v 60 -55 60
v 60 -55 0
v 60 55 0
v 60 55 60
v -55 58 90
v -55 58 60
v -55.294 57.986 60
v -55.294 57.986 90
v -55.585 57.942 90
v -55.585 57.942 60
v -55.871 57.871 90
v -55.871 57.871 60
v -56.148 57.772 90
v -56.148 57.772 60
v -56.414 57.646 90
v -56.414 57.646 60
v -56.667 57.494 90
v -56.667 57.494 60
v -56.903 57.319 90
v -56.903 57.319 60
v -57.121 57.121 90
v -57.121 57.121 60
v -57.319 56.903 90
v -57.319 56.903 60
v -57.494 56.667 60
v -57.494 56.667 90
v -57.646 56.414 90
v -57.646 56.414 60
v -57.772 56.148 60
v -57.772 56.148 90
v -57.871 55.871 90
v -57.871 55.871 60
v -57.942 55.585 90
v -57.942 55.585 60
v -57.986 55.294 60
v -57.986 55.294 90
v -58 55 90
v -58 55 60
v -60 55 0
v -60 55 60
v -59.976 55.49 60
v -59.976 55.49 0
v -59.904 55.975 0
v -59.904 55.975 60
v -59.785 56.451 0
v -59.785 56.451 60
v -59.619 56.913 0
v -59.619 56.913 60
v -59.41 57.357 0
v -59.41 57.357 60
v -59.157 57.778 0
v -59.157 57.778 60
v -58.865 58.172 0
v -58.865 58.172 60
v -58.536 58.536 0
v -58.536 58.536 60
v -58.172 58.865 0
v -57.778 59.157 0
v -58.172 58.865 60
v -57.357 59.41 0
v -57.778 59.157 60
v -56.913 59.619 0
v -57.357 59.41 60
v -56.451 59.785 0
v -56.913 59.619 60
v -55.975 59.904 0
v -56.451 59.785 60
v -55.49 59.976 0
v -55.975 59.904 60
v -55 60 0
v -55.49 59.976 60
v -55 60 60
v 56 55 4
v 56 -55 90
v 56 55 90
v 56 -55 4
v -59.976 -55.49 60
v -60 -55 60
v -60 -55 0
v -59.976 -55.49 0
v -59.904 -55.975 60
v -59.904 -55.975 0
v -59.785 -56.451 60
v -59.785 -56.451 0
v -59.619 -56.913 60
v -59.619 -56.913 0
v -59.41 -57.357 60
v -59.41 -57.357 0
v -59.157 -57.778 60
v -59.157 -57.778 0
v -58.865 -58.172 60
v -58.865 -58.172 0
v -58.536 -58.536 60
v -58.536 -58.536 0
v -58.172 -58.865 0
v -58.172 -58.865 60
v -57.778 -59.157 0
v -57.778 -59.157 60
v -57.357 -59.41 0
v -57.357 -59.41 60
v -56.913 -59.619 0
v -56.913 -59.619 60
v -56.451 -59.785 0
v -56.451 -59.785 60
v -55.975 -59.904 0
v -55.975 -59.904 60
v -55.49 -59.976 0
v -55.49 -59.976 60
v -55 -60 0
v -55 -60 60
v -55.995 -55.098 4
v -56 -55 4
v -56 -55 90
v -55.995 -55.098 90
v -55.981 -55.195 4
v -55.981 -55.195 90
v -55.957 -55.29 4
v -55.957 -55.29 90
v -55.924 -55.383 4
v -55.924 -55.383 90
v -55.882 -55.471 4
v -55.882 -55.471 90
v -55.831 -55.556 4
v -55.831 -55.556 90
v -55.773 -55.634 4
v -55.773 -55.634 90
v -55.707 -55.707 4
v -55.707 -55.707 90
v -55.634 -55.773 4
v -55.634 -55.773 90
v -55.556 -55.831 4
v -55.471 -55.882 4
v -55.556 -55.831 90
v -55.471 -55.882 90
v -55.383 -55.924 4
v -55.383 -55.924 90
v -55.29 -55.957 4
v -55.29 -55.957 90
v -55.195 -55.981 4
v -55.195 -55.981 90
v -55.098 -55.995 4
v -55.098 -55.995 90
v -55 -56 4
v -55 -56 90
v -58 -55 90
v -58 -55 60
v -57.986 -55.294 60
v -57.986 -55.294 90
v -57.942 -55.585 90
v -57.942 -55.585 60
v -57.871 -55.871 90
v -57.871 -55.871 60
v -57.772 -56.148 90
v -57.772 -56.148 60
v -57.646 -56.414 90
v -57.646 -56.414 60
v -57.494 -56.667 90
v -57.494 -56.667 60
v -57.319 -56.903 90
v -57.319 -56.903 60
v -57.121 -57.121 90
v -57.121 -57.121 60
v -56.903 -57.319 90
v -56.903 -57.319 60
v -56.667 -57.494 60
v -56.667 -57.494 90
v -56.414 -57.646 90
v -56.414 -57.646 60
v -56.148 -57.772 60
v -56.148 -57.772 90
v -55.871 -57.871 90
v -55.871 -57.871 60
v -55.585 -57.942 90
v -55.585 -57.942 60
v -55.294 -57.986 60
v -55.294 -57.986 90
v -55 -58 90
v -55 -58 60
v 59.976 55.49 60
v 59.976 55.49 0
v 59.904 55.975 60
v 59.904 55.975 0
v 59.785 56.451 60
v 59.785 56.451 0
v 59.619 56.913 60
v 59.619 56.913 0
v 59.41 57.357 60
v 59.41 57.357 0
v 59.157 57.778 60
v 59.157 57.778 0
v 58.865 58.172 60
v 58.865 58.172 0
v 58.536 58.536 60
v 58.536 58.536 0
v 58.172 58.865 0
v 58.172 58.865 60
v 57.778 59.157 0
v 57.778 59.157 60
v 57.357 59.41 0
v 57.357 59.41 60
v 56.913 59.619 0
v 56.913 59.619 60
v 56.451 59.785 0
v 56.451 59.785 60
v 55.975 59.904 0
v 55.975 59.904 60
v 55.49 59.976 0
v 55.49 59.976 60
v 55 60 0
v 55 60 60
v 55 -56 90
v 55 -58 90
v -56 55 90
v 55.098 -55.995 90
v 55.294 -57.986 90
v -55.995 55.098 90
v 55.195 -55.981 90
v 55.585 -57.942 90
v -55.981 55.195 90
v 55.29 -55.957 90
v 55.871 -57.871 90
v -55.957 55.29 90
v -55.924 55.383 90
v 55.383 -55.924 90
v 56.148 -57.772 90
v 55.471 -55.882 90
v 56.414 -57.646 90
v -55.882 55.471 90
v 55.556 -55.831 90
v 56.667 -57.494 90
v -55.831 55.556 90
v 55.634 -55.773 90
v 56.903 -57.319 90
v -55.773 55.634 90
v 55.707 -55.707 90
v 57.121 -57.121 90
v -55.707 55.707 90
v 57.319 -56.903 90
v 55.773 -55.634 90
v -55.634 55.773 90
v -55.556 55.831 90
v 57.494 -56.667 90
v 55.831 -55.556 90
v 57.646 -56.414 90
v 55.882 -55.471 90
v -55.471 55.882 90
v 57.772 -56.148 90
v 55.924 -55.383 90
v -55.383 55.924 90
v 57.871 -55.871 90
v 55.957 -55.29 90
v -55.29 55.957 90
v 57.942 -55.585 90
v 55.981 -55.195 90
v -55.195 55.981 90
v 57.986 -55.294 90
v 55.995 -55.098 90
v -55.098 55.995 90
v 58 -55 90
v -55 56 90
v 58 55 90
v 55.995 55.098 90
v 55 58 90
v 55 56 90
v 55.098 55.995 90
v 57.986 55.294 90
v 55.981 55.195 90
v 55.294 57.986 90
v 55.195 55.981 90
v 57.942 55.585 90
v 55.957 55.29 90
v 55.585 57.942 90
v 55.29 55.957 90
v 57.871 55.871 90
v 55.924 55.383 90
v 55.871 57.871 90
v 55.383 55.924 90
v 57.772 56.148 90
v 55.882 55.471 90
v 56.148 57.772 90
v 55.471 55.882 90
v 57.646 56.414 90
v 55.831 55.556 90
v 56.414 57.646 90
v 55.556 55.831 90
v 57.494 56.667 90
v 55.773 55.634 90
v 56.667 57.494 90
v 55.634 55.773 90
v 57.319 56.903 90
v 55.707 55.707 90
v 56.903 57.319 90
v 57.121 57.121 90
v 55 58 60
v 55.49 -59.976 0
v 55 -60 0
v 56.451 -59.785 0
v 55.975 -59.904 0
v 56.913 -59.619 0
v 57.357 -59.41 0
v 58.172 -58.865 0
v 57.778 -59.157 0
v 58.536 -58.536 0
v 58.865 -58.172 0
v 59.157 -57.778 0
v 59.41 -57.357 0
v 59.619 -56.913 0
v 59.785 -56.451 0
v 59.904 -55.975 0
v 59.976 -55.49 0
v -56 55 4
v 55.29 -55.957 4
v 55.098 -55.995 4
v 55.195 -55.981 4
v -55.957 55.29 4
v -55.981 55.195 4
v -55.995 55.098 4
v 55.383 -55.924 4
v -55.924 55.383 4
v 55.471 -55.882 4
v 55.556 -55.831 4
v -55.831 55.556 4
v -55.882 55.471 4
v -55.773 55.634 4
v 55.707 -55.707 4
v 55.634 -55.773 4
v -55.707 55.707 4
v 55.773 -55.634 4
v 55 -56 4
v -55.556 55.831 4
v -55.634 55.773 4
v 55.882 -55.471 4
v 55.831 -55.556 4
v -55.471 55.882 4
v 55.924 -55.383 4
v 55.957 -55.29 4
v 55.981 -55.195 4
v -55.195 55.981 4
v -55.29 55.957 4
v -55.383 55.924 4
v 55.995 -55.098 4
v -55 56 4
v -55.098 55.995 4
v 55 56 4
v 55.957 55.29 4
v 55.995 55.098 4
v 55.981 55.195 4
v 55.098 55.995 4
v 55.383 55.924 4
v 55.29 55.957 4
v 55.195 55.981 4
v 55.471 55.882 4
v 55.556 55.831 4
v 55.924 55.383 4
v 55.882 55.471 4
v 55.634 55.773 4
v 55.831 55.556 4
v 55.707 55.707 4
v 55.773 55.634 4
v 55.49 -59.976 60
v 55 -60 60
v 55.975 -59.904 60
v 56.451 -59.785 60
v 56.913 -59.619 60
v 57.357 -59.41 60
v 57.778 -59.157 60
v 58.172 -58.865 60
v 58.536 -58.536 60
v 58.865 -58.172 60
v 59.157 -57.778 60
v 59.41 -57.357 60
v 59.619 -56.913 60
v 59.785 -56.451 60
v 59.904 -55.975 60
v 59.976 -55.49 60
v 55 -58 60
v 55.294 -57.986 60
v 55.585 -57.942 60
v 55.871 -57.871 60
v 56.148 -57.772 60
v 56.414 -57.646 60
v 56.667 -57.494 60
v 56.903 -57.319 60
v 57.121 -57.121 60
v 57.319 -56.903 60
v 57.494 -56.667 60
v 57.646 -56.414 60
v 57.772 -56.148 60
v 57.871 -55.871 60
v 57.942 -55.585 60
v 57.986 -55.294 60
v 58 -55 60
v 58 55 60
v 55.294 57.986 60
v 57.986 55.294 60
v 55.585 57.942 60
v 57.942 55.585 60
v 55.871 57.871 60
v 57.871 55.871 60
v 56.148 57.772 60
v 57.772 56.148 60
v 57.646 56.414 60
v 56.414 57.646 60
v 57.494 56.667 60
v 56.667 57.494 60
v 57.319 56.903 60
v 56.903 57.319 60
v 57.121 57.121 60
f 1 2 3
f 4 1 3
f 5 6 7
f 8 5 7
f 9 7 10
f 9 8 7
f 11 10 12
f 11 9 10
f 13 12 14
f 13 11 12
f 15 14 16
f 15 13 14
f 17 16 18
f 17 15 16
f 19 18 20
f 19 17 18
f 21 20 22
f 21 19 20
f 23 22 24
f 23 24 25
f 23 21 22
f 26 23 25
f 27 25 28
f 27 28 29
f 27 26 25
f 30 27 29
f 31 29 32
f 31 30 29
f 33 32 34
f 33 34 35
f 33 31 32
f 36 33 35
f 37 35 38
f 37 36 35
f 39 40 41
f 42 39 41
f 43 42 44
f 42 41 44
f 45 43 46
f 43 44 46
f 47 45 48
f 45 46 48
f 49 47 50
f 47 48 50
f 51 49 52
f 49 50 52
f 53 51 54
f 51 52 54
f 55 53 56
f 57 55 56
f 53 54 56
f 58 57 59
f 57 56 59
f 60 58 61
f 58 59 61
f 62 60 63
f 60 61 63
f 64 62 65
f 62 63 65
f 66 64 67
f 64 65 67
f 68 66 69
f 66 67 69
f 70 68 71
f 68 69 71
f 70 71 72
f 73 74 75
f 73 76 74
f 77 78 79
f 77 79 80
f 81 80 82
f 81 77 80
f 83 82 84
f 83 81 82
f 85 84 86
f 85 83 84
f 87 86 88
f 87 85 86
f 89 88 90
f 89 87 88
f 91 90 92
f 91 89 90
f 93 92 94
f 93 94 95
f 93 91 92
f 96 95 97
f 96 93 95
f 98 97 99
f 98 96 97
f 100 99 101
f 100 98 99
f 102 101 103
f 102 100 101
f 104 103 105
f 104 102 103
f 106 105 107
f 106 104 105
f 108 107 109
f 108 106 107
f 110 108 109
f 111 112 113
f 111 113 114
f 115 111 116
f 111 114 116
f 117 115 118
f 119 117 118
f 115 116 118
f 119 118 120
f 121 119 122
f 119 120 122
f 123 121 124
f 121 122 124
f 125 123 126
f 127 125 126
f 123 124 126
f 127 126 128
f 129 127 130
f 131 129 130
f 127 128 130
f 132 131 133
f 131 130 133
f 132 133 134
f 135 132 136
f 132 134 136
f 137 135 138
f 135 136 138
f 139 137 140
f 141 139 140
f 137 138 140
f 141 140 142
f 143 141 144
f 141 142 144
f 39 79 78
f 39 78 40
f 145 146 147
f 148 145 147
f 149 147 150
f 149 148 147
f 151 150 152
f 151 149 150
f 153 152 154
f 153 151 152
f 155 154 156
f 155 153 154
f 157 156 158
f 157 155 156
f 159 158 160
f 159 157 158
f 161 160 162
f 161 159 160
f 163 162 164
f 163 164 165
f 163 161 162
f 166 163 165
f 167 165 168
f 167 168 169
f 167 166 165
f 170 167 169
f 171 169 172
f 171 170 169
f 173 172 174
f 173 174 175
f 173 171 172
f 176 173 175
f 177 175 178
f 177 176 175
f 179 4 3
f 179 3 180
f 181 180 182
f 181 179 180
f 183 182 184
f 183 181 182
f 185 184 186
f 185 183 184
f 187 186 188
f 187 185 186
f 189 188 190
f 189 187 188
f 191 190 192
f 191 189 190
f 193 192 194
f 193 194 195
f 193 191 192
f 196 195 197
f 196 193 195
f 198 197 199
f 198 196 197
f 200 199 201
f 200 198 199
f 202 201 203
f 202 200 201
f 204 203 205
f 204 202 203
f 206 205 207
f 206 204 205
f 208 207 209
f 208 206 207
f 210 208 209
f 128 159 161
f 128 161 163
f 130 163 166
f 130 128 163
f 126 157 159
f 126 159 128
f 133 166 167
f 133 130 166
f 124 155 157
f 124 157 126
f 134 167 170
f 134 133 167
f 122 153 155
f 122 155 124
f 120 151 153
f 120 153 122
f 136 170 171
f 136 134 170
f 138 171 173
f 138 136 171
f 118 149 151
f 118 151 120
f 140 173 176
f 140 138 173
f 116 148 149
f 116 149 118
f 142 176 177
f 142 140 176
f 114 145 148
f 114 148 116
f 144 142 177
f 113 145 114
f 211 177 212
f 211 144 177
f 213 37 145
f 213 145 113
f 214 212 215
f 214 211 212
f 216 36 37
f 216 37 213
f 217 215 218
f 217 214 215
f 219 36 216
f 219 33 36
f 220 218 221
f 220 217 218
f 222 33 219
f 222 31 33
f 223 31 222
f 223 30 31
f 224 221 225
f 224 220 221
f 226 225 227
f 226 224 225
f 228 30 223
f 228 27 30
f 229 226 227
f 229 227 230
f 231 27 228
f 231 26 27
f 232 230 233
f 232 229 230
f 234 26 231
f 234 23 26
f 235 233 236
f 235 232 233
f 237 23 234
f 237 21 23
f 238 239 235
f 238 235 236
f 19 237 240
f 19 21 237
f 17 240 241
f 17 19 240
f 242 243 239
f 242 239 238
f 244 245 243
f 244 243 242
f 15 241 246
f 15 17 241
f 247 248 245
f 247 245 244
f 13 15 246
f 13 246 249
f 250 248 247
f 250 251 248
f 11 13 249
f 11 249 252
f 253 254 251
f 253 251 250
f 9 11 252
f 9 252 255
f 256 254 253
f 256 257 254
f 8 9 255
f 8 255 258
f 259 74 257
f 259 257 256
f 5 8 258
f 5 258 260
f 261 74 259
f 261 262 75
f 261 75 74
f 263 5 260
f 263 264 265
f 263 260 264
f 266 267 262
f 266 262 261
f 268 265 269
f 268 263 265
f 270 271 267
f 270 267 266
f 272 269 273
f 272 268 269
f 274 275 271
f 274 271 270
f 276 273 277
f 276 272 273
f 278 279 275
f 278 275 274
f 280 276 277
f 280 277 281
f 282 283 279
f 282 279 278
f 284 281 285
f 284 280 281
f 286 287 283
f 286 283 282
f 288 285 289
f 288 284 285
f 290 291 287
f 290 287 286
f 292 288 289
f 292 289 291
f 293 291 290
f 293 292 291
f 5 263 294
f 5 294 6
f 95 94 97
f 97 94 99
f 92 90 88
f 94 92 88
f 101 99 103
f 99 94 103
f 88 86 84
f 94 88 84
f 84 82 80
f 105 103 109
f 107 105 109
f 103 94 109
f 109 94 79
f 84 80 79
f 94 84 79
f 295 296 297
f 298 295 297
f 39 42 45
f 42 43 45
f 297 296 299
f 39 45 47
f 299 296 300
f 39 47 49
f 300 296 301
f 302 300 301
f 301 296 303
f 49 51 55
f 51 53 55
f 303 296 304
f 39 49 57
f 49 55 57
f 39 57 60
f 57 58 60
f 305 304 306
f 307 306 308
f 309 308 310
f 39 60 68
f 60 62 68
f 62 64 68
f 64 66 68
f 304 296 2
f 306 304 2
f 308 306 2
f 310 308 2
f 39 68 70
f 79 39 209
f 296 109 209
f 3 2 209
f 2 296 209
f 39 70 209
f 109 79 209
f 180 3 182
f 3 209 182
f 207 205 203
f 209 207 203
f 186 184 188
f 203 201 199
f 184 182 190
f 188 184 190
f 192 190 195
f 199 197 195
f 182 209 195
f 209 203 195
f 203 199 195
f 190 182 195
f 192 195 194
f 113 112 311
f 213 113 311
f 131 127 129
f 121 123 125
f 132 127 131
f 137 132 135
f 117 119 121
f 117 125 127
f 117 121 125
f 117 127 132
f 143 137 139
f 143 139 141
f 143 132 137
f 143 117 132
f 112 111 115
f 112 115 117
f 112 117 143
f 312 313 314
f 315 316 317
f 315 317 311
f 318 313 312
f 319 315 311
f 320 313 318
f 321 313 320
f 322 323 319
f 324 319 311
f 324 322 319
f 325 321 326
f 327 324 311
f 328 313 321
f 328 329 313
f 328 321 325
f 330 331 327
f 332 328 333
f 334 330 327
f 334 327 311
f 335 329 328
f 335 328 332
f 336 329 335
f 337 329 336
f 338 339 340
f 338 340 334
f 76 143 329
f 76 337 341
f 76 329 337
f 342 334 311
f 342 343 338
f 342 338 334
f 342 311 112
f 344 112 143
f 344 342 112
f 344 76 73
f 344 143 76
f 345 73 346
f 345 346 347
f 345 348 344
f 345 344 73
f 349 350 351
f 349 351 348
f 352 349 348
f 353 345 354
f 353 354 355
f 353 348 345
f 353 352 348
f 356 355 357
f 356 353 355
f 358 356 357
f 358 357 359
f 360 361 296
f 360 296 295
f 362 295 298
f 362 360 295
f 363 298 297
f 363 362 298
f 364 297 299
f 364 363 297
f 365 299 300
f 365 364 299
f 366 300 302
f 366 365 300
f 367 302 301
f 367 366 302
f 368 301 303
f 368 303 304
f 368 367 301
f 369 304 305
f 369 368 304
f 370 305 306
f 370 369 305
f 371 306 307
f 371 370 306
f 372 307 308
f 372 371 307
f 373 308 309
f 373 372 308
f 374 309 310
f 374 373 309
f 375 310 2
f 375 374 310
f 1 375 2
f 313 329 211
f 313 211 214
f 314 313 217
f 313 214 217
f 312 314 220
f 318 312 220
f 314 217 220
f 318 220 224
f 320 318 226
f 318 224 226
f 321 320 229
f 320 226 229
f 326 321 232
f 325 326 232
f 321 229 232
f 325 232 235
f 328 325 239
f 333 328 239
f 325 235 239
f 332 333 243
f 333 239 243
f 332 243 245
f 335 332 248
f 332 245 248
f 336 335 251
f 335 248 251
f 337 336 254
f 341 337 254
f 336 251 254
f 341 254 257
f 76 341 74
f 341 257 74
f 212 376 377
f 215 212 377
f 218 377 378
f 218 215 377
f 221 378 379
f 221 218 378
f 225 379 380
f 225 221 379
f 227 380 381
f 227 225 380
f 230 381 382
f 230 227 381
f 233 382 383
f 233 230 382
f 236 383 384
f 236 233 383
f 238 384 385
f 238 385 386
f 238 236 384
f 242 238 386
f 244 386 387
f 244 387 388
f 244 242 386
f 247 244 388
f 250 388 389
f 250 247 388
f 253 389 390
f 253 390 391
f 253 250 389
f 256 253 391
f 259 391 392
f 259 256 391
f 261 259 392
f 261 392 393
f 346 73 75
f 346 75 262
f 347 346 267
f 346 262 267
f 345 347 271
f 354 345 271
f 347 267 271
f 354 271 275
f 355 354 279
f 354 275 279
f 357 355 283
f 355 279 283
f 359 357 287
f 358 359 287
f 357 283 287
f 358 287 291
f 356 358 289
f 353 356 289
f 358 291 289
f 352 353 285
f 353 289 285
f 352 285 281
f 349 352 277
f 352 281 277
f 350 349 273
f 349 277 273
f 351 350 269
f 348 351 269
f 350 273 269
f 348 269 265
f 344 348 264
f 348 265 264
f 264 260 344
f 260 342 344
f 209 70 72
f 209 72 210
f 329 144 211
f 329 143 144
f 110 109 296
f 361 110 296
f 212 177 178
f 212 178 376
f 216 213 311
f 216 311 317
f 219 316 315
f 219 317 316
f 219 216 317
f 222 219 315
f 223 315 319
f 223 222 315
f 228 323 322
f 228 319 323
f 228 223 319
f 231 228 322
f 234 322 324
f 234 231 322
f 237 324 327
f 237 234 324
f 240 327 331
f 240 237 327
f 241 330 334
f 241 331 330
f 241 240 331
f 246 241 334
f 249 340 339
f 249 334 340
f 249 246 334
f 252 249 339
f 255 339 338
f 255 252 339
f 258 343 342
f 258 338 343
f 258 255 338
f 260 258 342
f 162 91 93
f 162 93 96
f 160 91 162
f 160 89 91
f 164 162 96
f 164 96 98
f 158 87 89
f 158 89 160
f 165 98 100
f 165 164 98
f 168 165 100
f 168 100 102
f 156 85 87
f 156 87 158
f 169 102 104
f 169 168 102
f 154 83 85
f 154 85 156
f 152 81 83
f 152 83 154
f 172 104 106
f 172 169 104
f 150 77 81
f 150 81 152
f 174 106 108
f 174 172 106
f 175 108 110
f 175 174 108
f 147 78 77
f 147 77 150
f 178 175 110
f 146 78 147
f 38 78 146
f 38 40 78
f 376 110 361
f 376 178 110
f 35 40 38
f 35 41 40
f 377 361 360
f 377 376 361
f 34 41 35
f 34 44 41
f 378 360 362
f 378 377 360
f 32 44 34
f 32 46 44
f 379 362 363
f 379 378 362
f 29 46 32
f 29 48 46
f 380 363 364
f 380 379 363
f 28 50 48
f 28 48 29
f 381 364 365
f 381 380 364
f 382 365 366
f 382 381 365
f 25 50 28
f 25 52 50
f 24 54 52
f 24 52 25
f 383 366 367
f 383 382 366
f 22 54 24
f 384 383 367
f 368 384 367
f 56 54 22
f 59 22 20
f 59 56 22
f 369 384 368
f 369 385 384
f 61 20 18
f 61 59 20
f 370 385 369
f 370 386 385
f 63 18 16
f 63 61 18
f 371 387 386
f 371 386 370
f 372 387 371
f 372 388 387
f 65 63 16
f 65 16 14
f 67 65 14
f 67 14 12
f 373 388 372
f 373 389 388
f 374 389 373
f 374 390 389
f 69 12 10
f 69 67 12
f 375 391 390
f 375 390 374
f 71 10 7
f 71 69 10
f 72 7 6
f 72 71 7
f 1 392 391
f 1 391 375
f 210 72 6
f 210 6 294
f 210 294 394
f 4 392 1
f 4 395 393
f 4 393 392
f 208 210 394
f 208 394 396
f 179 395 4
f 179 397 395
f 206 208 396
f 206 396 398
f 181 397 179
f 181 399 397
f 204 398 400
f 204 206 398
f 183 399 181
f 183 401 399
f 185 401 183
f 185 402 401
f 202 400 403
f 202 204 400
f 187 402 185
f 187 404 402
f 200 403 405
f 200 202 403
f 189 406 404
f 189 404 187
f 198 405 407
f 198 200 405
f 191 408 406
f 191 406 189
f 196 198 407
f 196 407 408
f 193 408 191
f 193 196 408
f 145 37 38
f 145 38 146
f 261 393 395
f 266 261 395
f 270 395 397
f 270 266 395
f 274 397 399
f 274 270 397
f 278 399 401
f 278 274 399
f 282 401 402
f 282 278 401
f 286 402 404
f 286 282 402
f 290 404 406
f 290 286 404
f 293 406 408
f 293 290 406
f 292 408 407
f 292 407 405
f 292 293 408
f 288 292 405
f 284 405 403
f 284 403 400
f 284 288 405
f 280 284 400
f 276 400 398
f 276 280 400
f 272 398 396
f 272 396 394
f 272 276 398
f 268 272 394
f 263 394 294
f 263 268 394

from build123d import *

# Parameters (mm, degrees)
SKETCH1_W           = 120
SKETCH1_H           = 120
BOSS_EXTRUDE1_DEPTH = 90
FILLET1_R           = 5
SHELL1_T            = -4
CUT_EXTRUDE1_DEPTH  = 30


with BuildPart() as part:
    # Sketch1 → Boss-Extrude1 (new body)
    with BuildSketch(Plane.XY):
        Rectangle(SKETCH1_W, SKETCH1_H)
    extrude(amount=BOSS_EXTRUDE1_DEPTH)

    # Fillet1
    fillet1_edges = [part.edges().sort_by_distance(p)[0] for p in [
        (60, -60, 45),
        (-60, -60, 45),
        (-60, 60, 45),
        (60, 60, 45),
    ]]
    fillet(fillet1_edges, radius=FILLET1_R)

    # Shell1
    shell1_openings = [part.faces().sort_by_distance(p)[0] for p in [
        (0, 0, 90),
    ]]
    offset(amount=SHELL1_T, openings=shell1_openings, kind=Kind.INTERSECTION)

    # Sketch2 → Cut-Extrude1 (cut)
    with BuildSketch(Plane.XY.offset(90)):
        with BuildLine():
            Line((-55, -60), (55, -60))
            ThreePointArc((55, -60), (58.535533906, -58.535533906), (60, -55))
            Line((60, -55), (60, 55))
            ThreePointArc((60, 55), (58.535533906, 58.535533906), (55, 60))
            Line((55, 60), (-55, 60))
            ThreePointArc((-55, 60), (-58.535533906, 58.535533906), (-60, 55))
            Line((-60, 55), (-60, -55))
            ThreePointArc((-60, -55), (-58.535533906, -58.535533906), (-55, -60))
        make_face()
        with BuildLine():
            Line((55, 58), (-55, 58))
            ThreePointArc((-55, 58), (-57.121320344, 57.121320344), (-58, 55))
            Line((-58, 55), (-58, -55))
            ThreePointArc((-58, -55), (-57.121320344, -57.121320344), (-55, -58))
            Line((-55, -58), (55, -58))
            ThreePointArc((55, -58), (57.121320344, -57.121320344), (58, -55))
            Line((58, -55), (58, 55))
            ThreePointArc((58, 55), (57.121320344, 57.121320344), (55, 58))
        make_face(mode=Mode.SUBTRACT)
    extrude(amount=-CUT_EXTRUDE1_DEPTH, mode=Mode.SUBTRACT)


solid = part.part
